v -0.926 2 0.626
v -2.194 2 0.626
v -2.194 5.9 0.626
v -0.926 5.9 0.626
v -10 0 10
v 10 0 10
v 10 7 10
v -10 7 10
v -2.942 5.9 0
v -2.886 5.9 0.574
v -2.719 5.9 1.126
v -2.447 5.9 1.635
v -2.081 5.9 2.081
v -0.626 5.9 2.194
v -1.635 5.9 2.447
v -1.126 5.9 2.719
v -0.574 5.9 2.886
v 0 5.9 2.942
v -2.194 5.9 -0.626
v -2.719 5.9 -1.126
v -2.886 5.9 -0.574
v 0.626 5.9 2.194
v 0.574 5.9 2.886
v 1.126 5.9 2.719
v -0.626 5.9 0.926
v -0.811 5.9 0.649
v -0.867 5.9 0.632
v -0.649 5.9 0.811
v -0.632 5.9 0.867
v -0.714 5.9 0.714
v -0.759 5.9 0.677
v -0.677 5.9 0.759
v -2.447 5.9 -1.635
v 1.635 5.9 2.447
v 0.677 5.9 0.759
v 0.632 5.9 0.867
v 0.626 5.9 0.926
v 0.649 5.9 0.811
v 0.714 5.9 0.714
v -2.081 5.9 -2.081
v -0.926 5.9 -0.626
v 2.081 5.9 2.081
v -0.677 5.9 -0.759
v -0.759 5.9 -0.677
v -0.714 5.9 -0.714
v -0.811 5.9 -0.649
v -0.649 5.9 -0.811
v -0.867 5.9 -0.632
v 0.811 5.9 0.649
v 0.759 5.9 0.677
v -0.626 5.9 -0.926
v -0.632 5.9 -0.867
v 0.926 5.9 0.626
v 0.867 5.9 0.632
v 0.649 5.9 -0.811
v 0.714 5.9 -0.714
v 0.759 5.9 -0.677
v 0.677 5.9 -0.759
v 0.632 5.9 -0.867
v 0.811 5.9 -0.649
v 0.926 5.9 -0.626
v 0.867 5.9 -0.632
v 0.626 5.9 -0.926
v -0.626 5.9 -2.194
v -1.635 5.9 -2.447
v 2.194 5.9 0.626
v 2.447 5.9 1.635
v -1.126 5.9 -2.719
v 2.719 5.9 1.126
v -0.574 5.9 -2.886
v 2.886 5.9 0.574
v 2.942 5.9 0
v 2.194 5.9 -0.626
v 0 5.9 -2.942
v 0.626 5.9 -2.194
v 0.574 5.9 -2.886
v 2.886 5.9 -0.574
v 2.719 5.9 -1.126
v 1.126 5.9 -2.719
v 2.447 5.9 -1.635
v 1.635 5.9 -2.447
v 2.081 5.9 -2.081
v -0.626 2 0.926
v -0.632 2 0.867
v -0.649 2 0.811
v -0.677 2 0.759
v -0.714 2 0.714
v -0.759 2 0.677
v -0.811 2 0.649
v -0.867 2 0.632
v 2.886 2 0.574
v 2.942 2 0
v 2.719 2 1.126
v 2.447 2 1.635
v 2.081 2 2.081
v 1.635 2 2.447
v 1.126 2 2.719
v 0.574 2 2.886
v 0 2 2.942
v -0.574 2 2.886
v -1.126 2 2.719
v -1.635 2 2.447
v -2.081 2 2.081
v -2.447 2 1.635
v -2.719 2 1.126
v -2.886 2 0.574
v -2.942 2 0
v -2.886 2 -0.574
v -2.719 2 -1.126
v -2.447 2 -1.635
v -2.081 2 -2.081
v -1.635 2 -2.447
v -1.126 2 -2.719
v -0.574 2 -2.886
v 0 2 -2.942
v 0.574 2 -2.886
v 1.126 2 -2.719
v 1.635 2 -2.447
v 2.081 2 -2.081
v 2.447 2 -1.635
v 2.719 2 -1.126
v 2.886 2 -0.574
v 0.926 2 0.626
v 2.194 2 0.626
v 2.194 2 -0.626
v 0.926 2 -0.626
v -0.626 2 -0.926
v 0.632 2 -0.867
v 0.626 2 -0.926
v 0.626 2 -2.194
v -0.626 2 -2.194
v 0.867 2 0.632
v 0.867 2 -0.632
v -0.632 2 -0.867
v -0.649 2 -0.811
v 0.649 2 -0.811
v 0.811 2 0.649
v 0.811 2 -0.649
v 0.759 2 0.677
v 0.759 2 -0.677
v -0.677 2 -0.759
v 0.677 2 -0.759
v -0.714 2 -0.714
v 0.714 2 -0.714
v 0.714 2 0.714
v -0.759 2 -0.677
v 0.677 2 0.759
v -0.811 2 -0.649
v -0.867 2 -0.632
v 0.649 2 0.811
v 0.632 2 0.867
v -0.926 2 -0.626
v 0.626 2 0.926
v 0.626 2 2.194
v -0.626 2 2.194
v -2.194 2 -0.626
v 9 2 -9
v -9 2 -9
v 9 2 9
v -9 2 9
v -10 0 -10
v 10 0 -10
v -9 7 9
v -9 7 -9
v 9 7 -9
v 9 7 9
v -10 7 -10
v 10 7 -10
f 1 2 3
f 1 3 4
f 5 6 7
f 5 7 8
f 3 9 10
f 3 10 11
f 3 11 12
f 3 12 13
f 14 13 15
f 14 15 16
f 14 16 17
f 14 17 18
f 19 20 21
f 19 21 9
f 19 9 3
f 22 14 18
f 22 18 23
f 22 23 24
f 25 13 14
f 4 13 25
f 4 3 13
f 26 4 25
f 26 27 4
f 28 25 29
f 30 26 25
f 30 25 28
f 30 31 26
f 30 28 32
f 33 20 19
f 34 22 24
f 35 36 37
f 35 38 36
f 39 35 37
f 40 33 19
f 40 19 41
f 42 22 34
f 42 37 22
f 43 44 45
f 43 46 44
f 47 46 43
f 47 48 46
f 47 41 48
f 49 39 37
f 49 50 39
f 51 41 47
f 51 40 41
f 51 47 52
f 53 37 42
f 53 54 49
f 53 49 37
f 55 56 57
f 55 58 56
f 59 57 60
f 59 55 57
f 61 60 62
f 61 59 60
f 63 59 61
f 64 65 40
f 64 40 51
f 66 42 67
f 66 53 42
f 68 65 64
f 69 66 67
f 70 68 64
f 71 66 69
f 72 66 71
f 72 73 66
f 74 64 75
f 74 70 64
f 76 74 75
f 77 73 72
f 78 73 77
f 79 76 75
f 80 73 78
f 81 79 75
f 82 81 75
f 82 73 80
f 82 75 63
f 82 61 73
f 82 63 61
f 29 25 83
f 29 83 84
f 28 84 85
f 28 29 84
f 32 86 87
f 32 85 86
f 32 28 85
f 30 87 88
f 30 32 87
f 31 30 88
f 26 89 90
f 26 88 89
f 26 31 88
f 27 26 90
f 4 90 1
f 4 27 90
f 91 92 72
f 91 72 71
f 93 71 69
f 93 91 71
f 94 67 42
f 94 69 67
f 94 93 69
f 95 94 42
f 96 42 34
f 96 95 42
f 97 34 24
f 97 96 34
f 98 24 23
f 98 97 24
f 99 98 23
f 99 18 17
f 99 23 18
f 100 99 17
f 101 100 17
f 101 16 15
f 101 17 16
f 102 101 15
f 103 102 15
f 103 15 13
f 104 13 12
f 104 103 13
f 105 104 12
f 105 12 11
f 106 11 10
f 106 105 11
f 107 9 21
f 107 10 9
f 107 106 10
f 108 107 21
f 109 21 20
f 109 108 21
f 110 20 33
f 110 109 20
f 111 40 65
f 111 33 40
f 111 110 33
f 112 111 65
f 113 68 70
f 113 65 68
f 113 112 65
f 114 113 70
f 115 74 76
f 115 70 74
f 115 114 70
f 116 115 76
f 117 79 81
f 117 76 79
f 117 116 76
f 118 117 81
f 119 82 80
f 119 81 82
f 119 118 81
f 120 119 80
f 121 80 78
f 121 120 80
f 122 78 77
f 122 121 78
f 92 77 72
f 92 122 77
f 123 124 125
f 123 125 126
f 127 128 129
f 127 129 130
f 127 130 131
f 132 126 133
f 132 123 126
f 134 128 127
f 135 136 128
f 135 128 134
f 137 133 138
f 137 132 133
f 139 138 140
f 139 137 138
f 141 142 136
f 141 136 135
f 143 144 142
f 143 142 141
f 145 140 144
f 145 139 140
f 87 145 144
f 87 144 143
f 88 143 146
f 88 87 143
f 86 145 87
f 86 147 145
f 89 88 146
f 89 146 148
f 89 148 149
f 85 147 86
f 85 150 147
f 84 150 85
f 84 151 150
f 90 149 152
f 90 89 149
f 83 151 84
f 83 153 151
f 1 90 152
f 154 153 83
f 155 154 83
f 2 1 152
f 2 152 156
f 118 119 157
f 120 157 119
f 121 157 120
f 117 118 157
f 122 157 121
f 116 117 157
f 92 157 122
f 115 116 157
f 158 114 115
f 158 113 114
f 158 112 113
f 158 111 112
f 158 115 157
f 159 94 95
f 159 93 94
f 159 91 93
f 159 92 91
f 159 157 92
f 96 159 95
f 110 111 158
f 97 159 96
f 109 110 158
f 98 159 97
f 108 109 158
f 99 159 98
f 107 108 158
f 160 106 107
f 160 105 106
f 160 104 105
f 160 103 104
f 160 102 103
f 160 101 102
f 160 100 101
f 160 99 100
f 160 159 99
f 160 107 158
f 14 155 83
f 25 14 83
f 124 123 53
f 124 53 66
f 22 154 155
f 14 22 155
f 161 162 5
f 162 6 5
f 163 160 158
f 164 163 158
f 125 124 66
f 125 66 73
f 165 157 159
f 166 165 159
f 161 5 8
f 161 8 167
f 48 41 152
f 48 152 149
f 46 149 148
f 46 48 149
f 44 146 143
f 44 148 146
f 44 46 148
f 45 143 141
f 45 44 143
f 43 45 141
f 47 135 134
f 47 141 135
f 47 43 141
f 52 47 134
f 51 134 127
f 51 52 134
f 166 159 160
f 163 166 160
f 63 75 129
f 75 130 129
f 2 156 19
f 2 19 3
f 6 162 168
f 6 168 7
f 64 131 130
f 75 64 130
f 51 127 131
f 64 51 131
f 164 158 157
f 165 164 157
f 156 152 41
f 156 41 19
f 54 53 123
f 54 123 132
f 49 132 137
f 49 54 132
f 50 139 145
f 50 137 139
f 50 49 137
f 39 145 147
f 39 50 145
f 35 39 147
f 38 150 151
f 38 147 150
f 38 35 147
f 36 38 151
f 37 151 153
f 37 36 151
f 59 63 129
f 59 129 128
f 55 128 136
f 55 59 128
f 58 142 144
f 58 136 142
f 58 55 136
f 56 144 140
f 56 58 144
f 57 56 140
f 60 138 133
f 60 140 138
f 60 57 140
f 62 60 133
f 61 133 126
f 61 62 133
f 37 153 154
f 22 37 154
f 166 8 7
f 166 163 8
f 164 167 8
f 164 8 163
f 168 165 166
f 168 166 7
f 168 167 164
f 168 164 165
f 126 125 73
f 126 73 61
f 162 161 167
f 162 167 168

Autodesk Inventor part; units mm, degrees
ref_plane "YZ Plane" through (0, 0, 0) normal (1, 0, 0) x (0, 1, 0)
ref_plane "XZ Plane" through (0, 0, 0) normal (0, 1, 0) x (-1, 0, 0)
ref_plane "XY Plane" through (0, 0, 0) normal (0, 0, 1) x (1, 0, 0)
sketch "Sketch1" plane through (0, 0, 0) normal (0, 1, 0) x (-1, 0, 0)
  line L0 (-10, 10) -> (10, 10)
  line L1 (10, 10) -> (10, -10)
  line L2 (10, -10) -> (-10, -10)
  line L3 (-10, -10) -> (-10, 10)
  line L4 (-10, 10) -> (10, -10) construction
  line L5 (10, 10) -> (-10, -10) construction
  point P0 (0, 0)
extrude "Extrusion1" add sketch "Sketch1" along normal blind 2
sketch "Sketch2" plane through (0, 2, 0) normal (0, 1, 0) x (1, 0, 0)
  line L0 (9, -9) -> (-9, -9)
  line L1 (-9, -9) -> (-9, 9)
  line L2 (-9, 9) -> (9, 9)
  line L3 (9, 9) -> (9, -9)
  line L4 (9, -9) -> (-9, 9) construction
  line L5 (-9, -9) -> (9, 9) construction
  line L6 (10, -10) -> (-10, -10)
  line L7 (-10, -10) -> (-10, 10)
  line L8 (-10, 10) -> (10, 10)
  line L9 (10, 10) -> (10, -10)
  line L10 (10, -10) -> (-10, 10) construction
  line L11 (-10, -10) -> (10, 10) construction
  point P0 (0, 0)
extrude "Extrusion2" add sketch "Sketch2" along normal blind 5
sketch "Sketch3" plane through (0, 2, 0) normal (0, 1, 0) x (1, 0, 0)
  circle A0 centre (0, 0) radius 2.9425
  line L0 (0.626, -2.1935) -> (-0.626, -2.1935)
  line L1 (-0.626, 2.1935) -> (0.626, 2.1935)
  line L2 (-2.1935, 0.626) -> (-2.1935, -0.626)
  line L3 (2.1935, -0.626) -> (2.1935, 0.626)
  line L4 (-0.626, -2.1935) -> (-0.626, -0.626)
  line L5 (-0.626, 0.626) -> (-0.626, 2.1935)
  line L6 (-2.1935, -0.626) -> (-0.626, -0.626)
  line L7 (0.626, -0.626) -> (2.1935, -0.626)
  line L8 (2.1935, 0.626) -> (0.626, 0.626)
  line L9 (-0.626, 0.626) -> (-2.1935, 0.626)
  line L10 (0.626, 2.1935) -> (0.626, 0.626)
  line L11 (0.626, -0.626) -> (0.626, -2.1935)
extrude "Extrusion4" add sketch "Sketch3" along normal blind 3.9
fillet "Fillet1" radius 0.3 4 edges at (-0.626, 3.95, -0.626) (-0.626, 3.95, 0.626) (0.626, 3.95, -0.626) (0.626, 3.95, 0.626)
properties part number "test2"
